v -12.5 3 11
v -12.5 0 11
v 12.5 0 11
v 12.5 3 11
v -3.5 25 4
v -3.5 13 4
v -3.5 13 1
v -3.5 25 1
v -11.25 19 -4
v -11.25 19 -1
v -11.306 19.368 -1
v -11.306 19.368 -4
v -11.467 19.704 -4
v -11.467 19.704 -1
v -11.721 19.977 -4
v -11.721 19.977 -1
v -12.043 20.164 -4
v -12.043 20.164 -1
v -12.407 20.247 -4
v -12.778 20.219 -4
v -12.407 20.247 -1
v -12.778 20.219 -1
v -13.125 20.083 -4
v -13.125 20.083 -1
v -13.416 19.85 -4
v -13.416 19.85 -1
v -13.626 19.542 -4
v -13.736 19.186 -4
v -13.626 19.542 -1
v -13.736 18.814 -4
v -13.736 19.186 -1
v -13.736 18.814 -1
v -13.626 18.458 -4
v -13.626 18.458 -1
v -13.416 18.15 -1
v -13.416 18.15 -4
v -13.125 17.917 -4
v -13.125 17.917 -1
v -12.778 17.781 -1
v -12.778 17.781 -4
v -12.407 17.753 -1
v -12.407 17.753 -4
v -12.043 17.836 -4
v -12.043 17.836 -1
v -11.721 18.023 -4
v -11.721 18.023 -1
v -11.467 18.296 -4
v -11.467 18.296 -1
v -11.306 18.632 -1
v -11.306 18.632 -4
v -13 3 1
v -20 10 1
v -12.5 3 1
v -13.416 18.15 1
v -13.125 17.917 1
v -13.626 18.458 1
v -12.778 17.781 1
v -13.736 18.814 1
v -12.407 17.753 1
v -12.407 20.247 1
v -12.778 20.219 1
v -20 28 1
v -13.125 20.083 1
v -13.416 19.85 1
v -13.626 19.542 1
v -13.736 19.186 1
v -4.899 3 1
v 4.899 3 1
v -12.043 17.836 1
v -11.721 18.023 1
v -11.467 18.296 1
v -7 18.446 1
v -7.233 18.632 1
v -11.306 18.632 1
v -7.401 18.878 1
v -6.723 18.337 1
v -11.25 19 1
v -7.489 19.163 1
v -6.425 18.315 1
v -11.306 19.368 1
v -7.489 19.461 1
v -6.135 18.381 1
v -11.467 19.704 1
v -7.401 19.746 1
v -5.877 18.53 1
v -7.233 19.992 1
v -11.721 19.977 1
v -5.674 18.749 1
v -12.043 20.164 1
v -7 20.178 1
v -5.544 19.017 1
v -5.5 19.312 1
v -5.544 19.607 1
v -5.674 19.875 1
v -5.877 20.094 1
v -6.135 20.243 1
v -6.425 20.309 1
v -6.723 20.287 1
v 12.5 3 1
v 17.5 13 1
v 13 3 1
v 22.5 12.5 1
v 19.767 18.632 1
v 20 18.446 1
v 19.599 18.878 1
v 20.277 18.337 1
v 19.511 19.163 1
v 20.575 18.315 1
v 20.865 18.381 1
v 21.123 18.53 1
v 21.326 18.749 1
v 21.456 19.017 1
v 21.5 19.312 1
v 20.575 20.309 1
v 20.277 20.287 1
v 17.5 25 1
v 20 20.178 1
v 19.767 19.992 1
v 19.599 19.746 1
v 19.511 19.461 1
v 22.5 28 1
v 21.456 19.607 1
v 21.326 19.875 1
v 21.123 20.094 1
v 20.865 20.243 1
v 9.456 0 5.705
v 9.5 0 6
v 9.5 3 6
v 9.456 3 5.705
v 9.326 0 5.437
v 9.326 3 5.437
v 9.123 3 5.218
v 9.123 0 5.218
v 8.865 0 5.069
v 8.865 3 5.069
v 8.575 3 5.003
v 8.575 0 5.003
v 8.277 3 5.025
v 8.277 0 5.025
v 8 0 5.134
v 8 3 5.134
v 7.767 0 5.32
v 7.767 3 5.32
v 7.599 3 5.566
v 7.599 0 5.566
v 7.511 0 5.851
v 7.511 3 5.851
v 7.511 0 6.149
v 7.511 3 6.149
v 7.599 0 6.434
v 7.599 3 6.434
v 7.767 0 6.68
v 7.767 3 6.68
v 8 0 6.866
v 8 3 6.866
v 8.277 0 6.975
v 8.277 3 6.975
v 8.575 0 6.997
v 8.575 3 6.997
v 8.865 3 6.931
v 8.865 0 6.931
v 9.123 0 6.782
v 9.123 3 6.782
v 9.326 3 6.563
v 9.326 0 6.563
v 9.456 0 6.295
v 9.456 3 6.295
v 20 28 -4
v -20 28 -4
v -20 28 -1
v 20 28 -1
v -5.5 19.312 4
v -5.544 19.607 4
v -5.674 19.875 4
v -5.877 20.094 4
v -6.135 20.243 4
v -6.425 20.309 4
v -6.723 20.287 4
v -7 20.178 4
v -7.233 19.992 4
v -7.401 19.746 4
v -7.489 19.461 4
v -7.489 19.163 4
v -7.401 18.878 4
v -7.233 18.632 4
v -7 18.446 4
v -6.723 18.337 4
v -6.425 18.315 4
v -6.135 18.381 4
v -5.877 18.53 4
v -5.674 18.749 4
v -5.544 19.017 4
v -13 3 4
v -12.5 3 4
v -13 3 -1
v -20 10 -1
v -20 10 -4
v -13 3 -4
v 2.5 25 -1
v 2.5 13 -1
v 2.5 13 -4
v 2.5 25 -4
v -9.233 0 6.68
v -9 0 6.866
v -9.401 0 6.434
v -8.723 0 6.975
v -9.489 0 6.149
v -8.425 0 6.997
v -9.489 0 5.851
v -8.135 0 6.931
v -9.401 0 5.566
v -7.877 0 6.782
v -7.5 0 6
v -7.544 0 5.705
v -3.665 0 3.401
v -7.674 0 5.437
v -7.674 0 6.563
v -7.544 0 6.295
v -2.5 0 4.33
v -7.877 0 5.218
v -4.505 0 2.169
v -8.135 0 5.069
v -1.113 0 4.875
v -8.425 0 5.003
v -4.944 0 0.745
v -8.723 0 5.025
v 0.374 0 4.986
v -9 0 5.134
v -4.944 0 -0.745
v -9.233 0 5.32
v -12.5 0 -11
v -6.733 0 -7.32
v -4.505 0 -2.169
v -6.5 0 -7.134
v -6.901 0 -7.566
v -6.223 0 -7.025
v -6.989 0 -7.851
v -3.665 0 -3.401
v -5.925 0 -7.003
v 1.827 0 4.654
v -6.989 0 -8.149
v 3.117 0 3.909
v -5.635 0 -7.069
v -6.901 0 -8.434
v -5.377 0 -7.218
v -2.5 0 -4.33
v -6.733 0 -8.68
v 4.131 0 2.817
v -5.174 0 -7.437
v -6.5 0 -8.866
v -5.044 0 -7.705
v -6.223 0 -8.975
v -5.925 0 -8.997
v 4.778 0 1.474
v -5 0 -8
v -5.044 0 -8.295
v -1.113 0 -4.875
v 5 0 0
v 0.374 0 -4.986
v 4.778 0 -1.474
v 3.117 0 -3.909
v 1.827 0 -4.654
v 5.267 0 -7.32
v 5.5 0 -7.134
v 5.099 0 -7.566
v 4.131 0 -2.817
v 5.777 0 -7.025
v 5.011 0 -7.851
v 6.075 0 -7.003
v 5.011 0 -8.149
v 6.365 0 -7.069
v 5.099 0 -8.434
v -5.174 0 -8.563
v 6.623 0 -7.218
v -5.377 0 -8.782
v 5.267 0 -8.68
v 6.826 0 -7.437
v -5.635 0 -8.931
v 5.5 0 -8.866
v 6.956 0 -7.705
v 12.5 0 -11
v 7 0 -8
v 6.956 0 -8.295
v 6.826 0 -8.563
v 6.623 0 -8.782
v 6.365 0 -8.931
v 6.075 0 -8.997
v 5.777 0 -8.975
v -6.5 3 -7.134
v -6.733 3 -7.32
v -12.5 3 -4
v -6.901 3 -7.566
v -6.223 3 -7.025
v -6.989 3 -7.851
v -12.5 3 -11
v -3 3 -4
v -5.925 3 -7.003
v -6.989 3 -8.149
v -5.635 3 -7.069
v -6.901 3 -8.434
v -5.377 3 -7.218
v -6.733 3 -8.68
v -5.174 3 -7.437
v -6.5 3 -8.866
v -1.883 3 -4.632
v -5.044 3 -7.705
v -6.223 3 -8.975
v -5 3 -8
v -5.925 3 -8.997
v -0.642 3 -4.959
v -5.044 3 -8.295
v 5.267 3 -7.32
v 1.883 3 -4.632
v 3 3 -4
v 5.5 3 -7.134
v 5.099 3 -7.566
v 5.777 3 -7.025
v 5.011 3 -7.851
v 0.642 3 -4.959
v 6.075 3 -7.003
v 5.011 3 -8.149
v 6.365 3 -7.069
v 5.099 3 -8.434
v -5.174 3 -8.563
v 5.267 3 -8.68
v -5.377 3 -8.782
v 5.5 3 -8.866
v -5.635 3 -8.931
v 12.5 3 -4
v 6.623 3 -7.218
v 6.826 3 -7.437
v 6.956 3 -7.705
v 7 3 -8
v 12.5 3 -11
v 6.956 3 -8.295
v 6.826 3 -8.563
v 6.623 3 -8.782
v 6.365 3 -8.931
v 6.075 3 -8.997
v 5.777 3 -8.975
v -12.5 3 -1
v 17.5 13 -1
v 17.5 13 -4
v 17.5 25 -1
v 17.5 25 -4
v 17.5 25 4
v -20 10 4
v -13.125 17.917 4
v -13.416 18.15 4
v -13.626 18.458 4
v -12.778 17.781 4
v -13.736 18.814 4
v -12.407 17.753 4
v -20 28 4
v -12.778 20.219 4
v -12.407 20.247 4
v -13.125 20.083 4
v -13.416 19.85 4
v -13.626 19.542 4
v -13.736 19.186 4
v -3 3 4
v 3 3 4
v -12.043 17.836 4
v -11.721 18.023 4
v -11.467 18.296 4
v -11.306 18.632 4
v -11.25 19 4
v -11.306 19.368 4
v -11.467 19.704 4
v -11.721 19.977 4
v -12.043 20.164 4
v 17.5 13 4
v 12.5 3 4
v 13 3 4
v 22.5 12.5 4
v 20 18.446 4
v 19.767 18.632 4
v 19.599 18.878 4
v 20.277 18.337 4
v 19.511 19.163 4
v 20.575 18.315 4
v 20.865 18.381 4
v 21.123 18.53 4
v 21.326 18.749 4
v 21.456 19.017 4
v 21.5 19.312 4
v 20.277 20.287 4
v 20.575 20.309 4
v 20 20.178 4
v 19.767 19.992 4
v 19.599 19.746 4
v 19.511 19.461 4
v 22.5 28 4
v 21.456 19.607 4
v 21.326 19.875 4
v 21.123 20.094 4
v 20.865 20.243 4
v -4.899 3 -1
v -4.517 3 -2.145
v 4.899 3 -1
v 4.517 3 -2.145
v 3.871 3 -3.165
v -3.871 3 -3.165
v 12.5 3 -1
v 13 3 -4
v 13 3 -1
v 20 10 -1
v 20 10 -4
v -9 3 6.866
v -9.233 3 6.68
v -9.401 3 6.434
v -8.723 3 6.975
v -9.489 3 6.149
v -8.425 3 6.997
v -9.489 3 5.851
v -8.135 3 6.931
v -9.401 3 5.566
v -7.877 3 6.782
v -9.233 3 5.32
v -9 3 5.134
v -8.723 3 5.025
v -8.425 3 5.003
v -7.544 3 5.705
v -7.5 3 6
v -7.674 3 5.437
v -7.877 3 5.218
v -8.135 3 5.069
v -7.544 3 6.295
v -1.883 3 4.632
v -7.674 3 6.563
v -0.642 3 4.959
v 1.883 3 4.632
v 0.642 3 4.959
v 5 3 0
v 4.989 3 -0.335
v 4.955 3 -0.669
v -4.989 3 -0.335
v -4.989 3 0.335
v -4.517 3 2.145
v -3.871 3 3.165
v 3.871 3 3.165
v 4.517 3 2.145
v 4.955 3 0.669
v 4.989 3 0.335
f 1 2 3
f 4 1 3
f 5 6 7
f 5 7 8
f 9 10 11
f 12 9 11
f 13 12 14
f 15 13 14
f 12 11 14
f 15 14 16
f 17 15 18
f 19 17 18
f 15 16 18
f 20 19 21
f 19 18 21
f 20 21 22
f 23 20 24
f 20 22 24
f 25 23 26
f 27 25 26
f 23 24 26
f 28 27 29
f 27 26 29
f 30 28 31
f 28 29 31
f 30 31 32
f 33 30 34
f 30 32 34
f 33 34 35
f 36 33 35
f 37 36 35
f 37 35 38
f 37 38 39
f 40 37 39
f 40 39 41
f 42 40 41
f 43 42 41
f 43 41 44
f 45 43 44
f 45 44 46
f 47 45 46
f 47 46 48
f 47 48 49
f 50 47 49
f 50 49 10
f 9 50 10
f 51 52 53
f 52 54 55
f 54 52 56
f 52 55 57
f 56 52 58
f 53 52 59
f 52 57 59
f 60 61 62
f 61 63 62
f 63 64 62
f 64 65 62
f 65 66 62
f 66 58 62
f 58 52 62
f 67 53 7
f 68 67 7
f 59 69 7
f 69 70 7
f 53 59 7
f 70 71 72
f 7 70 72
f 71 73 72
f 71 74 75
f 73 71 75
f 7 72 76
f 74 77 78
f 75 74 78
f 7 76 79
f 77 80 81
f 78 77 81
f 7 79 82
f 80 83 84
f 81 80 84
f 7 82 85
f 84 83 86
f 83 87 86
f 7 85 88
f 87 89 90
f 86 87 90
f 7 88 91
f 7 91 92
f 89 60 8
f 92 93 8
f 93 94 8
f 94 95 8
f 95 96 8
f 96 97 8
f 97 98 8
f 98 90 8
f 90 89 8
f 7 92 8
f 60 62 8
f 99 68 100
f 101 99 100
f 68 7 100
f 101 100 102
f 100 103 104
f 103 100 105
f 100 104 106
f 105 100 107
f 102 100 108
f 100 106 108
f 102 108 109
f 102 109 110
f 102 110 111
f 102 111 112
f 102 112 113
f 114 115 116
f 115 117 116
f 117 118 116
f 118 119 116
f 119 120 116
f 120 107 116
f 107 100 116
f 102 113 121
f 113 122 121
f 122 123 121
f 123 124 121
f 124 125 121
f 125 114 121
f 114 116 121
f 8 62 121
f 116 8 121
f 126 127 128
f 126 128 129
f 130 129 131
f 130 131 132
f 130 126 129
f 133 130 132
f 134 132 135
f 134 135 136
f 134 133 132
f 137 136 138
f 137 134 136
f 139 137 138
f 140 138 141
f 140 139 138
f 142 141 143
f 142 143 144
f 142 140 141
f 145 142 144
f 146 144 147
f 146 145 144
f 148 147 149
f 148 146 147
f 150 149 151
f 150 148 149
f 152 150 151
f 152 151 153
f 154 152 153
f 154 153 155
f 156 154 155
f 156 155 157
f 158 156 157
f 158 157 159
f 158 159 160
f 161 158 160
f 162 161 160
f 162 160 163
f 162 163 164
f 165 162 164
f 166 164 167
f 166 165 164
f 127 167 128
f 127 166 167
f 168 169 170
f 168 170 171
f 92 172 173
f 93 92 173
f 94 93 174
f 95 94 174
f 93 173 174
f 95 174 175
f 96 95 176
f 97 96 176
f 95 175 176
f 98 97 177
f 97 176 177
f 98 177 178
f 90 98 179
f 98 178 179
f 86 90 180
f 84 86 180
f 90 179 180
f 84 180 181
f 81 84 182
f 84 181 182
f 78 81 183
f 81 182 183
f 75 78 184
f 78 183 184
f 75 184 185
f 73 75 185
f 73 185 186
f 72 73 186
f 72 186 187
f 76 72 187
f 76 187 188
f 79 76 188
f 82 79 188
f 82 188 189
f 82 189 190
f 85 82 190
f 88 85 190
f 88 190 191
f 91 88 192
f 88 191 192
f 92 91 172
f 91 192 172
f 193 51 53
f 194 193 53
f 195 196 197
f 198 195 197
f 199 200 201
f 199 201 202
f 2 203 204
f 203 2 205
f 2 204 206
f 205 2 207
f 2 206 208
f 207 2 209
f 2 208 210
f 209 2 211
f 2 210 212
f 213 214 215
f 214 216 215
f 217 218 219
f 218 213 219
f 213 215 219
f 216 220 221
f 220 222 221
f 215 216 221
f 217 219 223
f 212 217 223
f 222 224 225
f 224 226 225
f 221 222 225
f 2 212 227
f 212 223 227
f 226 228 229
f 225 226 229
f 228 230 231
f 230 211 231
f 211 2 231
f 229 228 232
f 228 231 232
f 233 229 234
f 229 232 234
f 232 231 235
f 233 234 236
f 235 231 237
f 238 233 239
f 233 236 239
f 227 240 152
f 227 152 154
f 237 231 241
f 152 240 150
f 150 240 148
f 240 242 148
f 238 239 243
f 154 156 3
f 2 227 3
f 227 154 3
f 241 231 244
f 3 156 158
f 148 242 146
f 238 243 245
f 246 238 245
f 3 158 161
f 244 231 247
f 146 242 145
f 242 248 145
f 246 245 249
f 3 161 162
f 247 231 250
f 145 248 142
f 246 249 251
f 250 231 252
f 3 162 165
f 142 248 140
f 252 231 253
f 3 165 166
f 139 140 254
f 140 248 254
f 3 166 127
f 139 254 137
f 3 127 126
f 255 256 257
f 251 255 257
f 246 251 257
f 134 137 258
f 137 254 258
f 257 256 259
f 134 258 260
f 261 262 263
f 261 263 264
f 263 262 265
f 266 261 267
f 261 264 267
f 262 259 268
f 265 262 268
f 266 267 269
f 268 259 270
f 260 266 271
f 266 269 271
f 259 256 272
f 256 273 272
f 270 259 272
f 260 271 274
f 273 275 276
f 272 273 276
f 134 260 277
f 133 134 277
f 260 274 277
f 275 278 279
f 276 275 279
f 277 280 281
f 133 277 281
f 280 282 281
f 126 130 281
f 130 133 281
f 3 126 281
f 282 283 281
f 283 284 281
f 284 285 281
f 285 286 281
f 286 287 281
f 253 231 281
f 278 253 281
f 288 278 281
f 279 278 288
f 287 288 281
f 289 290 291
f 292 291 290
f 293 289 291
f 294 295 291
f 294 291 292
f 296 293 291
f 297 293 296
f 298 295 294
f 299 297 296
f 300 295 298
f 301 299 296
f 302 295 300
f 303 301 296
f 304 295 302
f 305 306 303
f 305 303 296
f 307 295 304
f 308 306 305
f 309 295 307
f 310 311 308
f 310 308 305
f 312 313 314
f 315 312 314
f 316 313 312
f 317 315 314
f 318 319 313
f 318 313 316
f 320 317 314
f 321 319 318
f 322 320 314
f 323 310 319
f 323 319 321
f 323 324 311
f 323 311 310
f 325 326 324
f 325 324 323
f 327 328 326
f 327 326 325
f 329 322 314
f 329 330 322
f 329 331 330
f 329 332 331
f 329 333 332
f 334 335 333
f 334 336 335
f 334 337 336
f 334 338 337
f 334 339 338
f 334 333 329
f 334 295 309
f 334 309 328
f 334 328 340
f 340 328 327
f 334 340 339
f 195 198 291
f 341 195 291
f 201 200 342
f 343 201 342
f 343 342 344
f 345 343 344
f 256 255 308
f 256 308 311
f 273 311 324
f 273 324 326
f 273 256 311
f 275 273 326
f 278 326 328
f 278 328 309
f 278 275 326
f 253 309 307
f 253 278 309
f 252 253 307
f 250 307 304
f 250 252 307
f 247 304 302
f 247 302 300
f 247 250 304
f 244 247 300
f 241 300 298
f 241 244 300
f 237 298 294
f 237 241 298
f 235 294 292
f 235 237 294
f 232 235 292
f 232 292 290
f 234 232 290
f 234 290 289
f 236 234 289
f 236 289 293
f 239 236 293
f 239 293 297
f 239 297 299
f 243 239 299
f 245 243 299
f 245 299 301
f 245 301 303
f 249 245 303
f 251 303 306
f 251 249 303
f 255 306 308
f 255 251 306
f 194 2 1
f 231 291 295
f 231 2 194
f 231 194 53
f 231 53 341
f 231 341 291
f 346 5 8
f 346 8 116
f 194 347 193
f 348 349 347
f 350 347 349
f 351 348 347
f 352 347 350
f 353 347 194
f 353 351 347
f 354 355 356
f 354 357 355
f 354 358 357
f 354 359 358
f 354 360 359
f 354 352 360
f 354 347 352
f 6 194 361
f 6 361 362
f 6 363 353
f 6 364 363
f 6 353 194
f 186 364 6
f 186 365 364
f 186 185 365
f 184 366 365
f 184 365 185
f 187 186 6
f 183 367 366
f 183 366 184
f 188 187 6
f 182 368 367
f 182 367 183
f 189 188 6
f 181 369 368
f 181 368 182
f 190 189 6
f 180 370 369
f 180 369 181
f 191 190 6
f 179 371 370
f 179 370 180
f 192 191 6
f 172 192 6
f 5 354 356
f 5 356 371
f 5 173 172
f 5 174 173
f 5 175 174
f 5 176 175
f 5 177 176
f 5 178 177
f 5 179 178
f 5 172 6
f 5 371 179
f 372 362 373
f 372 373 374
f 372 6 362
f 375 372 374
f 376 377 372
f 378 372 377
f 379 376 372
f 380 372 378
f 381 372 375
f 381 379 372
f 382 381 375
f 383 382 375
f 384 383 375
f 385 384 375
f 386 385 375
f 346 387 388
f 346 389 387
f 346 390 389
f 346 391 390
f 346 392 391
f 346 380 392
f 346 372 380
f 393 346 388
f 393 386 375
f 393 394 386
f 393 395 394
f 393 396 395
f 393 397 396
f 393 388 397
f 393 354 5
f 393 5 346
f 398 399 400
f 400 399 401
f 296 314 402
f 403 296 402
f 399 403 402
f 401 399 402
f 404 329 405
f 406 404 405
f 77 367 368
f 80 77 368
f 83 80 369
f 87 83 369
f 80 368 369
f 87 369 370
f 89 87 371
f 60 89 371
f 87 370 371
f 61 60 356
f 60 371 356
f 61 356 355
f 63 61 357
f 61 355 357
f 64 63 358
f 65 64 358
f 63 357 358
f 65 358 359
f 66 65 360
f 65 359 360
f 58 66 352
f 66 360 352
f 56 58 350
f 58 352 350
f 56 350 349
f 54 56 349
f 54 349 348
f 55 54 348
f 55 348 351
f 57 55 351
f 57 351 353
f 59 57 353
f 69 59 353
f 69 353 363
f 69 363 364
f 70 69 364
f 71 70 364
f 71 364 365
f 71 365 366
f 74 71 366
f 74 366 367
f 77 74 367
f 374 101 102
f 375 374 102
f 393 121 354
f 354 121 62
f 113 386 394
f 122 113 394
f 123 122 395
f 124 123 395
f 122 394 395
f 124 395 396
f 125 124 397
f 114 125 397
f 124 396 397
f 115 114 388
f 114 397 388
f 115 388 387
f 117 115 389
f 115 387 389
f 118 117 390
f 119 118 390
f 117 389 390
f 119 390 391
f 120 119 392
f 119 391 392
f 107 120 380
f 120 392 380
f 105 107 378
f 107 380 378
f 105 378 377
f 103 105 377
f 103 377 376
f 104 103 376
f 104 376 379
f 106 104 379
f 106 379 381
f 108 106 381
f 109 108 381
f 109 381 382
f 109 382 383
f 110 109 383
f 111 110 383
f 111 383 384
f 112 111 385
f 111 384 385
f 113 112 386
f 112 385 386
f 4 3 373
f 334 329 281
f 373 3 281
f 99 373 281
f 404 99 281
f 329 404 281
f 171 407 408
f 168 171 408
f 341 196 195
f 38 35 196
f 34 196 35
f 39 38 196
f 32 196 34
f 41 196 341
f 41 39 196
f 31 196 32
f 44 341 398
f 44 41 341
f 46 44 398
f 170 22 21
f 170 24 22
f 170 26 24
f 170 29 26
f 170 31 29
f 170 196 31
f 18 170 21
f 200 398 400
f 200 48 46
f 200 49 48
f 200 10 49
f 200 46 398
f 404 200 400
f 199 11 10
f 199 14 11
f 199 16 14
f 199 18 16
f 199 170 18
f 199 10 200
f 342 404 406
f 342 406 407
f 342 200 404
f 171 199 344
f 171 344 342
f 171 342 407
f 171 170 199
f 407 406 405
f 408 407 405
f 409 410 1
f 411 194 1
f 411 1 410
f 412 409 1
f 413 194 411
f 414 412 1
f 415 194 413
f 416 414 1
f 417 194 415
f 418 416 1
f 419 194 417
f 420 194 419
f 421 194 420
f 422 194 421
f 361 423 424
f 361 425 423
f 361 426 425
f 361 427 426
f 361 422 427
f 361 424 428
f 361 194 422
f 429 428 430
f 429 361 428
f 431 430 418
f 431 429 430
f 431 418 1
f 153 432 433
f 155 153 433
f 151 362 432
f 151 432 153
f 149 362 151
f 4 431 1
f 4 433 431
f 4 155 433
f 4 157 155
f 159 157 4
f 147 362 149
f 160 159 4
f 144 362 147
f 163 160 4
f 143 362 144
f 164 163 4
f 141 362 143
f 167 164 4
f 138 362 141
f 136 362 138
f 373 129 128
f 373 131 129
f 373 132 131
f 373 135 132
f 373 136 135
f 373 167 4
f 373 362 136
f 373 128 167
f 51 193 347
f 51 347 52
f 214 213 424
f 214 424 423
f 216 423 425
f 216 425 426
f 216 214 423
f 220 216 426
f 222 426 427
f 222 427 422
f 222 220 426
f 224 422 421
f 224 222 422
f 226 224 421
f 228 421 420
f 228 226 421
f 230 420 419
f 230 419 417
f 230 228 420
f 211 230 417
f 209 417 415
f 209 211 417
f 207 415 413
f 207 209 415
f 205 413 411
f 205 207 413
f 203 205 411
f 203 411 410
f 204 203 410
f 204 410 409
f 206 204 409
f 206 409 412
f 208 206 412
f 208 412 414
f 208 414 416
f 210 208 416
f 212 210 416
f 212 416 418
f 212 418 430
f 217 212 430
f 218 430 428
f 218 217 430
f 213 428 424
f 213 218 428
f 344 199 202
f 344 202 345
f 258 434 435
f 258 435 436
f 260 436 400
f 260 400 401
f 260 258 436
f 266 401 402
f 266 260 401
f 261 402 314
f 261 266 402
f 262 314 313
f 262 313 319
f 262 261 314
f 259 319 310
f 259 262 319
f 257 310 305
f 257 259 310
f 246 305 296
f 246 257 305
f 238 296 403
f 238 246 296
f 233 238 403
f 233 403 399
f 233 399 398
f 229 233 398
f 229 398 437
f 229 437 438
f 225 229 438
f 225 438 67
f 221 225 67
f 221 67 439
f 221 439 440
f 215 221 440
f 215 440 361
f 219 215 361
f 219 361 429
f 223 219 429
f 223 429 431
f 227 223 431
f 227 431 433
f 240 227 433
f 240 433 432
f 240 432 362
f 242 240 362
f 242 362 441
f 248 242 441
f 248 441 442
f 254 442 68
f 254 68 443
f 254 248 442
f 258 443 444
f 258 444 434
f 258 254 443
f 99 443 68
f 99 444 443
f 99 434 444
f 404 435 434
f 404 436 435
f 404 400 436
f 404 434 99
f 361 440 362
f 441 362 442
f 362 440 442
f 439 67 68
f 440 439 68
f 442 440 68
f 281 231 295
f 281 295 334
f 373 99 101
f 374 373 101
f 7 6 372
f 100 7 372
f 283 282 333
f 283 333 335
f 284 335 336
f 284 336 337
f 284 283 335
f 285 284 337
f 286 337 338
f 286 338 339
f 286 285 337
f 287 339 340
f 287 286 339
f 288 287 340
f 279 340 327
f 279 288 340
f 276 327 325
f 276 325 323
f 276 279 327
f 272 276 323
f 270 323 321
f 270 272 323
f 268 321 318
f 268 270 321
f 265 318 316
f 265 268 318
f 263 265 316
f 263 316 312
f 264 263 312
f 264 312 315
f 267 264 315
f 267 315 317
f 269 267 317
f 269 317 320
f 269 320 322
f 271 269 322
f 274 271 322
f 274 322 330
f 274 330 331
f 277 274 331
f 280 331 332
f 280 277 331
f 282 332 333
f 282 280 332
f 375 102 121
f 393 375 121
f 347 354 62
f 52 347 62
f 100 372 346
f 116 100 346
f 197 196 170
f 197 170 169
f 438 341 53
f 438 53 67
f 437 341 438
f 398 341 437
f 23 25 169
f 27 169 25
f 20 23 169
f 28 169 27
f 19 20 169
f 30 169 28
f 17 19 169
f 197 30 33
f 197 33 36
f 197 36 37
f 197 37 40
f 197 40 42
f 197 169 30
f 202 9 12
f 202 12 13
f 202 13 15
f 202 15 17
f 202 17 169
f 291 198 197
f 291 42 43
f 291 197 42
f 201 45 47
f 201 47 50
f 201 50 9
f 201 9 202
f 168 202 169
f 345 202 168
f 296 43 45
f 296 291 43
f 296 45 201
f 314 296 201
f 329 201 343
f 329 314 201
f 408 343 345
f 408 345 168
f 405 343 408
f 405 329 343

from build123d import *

# Parameters (mm, degrees)
SKETCH1_W           = 25
SKETCH1_H           = 22
SKETCH1_R           = 1
SKETCH1_R_2         = 5
BOSS_EXTRUDE1_DEPTH = 3
SKETCH2_W           = 40
SKETCH2_H           = 8
BOSS_EXTRUDE2_DEPTH = 25
CHAMFER1_SIZE       = 7
SKETCH3_W           = 40
SKETCH3_H           = 2
CUT_EXTRUDE1_DEPTH  = 25
SKETCH7_W           = 21
SKETCH7_H           = 12
CUT_EXTRUDE2_DEPTH  = 3
SKETCH8_W           = 15
SKETCH8_H           = 12
CUT_EXTRUDE3_DEPTH  = 31
SKETCH9_R           = 1.25
CUT_EXTRUDE4_DEPTH  = 31
BOSS_EXTRUDE3_START = -3
BOSS_EXTRUDE3_DEPTH = 3
SKETCH11_R          = 1
CUT_EXTRUDE5_DEPTH  = 3


with BuildPart() as part:
    # Sketch1 → Boss-Extrude1 (new body)
    with BuildSketch(Plane(origin=(0, 0, 0), x_dir=(1, 0, 0), z_dir=(0, 1, 0))):
        Rectangle(SKETCH1_W, SKETCH1_H)
        with Locations((6, 8)):
            Circle(SKETCH1_R, mode=Mode.SUBTRACT)
        with Locations((-6, 8)):
            Circle(SKETCH1_R, mode=Mode.SUBTRACT)
        Circle(SKETCH1_R_2, mode=Mode.SUBTRACT)
        with Locations((-8.5, -6)):
            Circle(SKETCH1_R, mode=Mode.SUBTRACT)
        with Locations((8.5, -6)):
            Circle(SKETCH1_R, mode=Mode.SUBTRACT)
    extrude(amount=BOSS_EXTRUDE1_DEPTH)

    # Sketch2 → Boss-Extrude2 (add)
    with BuildSketch(Plane(origin=(0, 3, 0), x_dir=(1, 0, 0), z_dir=(0, 1, 0))):
        Rectangle(SKETCH2_W, SKETCH2_H)
    extrude(amount=BOSS_EXTRUDE2_DEPTH)

    # Chamfer1
    chamfer1_edges = [part.edges().sort_by_distance(p)[0] for p in [
        (20, 3, 0),
        (-20, 3, 0),
    ]]
    chamfer(chamfer1_edges, length=CHAMFER1_SIZE)

    # Sketch3 → Cut-Extrude1 (cut)
    with BuildSketch(Plane(origin=(0, 28, 0), x_dir=(1, 0, 0), z_dir=(0, 1, 0))):
        Rectangle(SKETCH3_W, SKETCH3_H)
    extrude(amount=-CUT_EXTRUDE1_DEPTH, mode=Mode.SUBTRACT)

    # Sketch7 → Cut-Extrude2 (cut)
    with BuildSketch(Plane.XY.offset(4)):
        with Locations((7, 19)):
            Rectangle(SKETCH7_W, SKETCH7_H)
    extrude(amount=-CUT_EXTRUDE2_DEPTH, mode=Mode.SUBTRACT)

    # Sketch8 → Cut-Extrude3 (cut)
    with BuildSketch(Plane.XY.offset(-1)):
        with Locations((10, 19)):
            Rectangle(SKETCH8_W, SKETCH8_H)
    extrude(amount=-CUT_EXTRUDE3_DEPTH, mode=Mode.SUBTRACT)

    # Sketch9 → Cut-Extrude4 (cut)
    with BuildSketch(Plane.XY.offset(4)):
        with Locations((-12.5, 19)):
            Circle(SKETCH9_R)
    extrude(amount=-CUT_EXTRUDE4_DEPTH, mode=Mode.SUBTRACT)

    # Sketch10 → Boss-Extrude3 (add)
    with BuildSketch(Plane.XY.offset(4).offset(BOSS_EXTRUDE3_START)):
        Polygon((20, 10), (22.5, 12.5), (22.5, 28), (20, 28), align=None)
    extrude(amount=BOSS_EXTRUDE3_DEPTH)

    # Sketch11 → Cut-Extrude5 (cut)
    with BuildSketch(Plane.XY.offset(4)):
        with Locations((20.5, 19.311850015)):
            Circle(SKETCH11_R)
        with Locations((-6.5, 19.311850015)):
            Circle(SKETCH11_R)
    extrude(amount=-CUT_EXTRUDE5_DEPTH, mode=Mode.SUBTRACT)


solid = part.part
